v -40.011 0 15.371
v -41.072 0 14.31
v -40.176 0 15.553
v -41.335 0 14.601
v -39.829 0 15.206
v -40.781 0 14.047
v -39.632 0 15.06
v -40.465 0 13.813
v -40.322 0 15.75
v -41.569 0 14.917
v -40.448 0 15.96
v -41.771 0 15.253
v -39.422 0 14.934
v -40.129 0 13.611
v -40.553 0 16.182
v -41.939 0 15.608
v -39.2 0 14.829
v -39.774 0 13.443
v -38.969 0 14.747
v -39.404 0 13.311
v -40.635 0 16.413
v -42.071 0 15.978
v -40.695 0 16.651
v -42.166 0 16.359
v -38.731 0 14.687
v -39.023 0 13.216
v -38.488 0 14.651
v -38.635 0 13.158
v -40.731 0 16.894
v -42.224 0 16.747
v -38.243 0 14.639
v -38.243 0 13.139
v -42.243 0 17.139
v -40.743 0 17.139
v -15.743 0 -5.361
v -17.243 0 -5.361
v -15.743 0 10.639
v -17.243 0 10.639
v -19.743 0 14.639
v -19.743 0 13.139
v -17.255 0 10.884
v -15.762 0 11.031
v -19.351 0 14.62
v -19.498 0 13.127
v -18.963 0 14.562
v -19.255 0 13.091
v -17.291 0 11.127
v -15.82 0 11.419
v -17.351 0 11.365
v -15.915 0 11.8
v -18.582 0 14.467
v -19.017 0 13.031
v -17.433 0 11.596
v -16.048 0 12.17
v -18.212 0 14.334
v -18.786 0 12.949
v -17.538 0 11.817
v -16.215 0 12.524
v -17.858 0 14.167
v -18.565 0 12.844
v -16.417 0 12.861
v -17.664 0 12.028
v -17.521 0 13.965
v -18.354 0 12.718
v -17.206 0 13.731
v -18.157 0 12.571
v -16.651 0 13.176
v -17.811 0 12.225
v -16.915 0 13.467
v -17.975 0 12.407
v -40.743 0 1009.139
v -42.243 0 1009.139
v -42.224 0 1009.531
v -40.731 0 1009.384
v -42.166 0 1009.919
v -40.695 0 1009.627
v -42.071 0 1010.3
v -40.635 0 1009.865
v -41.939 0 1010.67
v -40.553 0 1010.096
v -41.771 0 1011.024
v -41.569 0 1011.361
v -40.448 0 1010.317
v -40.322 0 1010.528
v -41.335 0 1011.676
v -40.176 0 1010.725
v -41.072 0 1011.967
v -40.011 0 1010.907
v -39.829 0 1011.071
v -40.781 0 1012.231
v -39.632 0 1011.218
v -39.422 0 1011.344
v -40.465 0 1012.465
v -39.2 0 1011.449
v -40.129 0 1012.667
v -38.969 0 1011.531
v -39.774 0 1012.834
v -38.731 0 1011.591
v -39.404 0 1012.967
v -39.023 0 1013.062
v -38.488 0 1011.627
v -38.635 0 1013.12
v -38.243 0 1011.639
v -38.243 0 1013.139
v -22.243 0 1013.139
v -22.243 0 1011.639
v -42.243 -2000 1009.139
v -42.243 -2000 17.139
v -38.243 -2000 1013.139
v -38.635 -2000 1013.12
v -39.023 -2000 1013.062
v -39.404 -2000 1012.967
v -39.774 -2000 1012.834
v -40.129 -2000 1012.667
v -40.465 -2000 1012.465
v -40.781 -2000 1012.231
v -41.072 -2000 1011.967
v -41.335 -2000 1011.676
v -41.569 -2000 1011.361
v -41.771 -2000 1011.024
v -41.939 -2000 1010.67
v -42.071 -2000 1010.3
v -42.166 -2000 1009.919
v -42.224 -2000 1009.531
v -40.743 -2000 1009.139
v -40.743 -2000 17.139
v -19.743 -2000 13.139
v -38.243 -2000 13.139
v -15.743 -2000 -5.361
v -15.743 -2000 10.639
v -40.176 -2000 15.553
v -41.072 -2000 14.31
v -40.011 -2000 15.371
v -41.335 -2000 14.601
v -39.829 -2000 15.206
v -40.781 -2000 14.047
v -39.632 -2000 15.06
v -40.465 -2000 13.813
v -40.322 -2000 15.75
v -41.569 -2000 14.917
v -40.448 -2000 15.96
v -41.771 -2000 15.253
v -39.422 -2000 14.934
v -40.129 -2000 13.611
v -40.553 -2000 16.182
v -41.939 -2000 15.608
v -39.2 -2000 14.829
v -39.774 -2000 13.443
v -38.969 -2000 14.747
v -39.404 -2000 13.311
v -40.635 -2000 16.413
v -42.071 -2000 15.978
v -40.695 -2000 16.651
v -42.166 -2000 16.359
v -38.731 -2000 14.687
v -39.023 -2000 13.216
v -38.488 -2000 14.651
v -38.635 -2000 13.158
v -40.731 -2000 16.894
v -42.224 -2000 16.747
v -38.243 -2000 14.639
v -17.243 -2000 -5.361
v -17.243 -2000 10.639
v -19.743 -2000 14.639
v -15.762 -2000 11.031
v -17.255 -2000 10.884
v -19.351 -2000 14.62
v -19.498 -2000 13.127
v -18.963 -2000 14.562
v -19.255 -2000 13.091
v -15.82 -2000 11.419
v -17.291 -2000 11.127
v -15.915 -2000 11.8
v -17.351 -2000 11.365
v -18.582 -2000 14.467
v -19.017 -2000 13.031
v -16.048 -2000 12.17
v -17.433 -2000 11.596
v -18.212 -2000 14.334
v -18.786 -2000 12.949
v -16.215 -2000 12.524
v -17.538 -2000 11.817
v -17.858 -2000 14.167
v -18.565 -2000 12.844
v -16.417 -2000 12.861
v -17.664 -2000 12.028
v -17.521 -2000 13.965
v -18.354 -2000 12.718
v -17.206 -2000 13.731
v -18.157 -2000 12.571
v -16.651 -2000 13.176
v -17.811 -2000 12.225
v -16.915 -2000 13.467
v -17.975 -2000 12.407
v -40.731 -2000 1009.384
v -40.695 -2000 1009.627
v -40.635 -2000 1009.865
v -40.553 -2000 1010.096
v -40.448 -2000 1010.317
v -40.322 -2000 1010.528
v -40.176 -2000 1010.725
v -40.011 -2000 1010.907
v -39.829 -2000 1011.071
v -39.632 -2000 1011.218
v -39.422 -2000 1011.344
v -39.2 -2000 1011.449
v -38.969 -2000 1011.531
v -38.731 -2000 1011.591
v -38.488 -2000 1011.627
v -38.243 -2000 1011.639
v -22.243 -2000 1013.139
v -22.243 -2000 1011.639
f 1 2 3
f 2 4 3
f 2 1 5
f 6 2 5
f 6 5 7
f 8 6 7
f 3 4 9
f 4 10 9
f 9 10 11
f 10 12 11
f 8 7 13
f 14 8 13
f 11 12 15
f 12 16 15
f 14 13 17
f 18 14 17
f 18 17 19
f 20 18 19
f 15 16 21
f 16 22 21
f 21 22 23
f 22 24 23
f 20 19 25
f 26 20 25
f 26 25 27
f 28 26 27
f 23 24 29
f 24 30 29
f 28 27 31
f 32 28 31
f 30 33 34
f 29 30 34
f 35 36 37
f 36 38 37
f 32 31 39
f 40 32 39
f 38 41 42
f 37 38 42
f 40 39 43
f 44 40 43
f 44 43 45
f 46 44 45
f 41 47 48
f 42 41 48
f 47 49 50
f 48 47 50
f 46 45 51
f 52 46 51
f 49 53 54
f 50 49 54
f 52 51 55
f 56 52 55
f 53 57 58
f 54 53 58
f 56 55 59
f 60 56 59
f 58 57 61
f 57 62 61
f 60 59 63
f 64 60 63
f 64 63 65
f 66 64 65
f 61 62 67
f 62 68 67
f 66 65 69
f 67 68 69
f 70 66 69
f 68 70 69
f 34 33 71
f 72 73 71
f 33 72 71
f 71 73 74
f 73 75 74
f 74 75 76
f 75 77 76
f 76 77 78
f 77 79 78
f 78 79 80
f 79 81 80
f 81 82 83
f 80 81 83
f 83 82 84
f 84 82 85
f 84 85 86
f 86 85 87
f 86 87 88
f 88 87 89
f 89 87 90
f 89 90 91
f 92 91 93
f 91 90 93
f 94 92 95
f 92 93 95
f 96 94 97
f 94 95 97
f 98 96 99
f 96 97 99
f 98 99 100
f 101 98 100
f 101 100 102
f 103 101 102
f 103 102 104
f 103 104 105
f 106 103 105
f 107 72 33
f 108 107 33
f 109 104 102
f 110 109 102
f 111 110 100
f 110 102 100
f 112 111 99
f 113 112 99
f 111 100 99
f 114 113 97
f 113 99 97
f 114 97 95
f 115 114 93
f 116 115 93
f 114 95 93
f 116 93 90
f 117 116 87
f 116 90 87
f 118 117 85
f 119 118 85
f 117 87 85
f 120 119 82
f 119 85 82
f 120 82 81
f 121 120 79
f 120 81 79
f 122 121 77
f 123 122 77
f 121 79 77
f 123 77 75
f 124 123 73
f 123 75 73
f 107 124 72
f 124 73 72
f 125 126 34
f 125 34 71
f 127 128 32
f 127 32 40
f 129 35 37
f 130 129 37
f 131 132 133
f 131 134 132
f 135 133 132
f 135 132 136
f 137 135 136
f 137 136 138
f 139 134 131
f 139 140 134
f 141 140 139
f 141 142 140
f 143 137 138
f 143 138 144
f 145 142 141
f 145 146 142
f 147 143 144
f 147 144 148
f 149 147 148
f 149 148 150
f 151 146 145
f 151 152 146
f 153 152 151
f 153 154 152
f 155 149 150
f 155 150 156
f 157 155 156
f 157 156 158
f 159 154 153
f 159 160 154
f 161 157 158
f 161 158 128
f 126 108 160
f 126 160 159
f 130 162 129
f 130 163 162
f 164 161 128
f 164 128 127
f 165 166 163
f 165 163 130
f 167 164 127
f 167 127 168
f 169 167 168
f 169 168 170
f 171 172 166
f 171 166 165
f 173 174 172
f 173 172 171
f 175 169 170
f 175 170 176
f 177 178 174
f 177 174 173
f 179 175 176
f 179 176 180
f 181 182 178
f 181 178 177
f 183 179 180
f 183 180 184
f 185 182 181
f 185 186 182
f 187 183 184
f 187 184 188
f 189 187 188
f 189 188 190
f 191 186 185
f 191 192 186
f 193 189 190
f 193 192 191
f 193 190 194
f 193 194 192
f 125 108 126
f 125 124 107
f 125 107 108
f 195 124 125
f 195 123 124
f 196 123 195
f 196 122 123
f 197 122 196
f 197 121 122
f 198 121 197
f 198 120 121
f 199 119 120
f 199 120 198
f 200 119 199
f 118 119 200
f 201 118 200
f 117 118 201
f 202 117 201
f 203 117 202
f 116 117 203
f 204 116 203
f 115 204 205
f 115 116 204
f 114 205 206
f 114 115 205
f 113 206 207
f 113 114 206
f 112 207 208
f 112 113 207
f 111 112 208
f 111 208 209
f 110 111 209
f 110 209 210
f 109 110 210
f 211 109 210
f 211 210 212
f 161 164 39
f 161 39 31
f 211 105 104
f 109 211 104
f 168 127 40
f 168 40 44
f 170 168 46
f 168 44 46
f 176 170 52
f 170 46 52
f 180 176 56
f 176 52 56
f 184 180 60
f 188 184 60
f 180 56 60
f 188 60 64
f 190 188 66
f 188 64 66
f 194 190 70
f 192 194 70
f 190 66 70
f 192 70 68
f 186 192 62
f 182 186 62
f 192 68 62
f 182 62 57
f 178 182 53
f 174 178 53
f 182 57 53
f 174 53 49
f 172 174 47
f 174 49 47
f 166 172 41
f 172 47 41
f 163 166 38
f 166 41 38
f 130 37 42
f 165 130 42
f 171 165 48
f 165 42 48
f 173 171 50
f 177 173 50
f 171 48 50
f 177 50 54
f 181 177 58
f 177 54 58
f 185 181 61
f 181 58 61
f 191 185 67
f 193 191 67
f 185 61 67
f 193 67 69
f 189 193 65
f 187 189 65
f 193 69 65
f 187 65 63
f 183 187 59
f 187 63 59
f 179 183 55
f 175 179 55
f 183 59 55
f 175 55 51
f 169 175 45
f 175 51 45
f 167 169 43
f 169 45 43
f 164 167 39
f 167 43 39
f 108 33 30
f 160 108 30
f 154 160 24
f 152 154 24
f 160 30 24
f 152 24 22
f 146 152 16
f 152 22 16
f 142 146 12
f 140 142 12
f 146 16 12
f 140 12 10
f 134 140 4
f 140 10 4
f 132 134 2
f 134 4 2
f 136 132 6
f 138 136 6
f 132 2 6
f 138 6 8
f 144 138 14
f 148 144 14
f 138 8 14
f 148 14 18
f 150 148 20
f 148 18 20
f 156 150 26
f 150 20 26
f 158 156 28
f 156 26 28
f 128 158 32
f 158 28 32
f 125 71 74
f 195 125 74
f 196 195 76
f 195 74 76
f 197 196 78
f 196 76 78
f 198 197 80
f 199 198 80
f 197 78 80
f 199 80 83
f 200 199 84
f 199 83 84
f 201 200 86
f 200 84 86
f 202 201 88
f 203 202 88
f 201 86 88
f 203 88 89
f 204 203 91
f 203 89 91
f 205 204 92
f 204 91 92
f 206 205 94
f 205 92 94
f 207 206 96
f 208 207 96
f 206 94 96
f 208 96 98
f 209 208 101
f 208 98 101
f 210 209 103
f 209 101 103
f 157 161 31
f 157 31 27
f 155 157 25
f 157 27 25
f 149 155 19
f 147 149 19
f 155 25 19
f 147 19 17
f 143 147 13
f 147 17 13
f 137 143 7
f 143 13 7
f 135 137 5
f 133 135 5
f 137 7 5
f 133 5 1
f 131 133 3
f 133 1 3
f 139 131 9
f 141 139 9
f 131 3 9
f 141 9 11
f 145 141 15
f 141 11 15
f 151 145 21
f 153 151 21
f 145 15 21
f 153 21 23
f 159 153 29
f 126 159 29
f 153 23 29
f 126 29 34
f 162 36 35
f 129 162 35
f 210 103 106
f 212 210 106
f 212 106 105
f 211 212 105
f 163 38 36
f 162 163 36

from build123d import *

# Parameters (mm, degrees)
F1_DEPTH = 2000


with BuildPart() as f1:
    # F0 (on Front) → F1 (new body)
    with BuildSketch(Plane.XZ):
        with BuildLine():
            Line((-17.24309, -5.361117), (-15.74309, -5.361117))
            Line((-15.74309, -5.361117), (-15.74309, 10.638883))
            ThreePointArc((-15.74309, 10.638883), (-16.914663, 13.46731), (-19.74309, 14.638883))
            Line((-19.74309, 14.638883), (-38.24309, 14.638883))
            ThreePointArc((-38.24309, 14.638883), (-40.010857, 15.371116), (-40.74309, 17.138883))
            Line((-40.74309, 17.138883), (-40.74309, 1009.138883))
            ThreePointArc((-40.74309, 1009.138883), (-40.010857, 1010.90665), (-38.24309, 1011.638883))
            Line((-38.24309, 1011.638883), (-22.24309, 1011.638883))
            Line((-22.24309, 1011.638883), (-22.24309, 1013.138883))
            Line((-22.24309, 1013.138883), (-38.24309, 1013.138883))
            ThreePointArc((-38.24309, 1013.138883), (-41.071517, 1011.96731), (-42.24309, 1009.138883))
            Line((-42.24309, 1009.138883), (-42.24309, 17.138883))
            ThreePointArc((-42.24309, 17.138883), (-41.071517, 14.310456), (-38.24309, 13.138883))
            Line((-38.24309, 13.138883), (-19.74309, 13.138883))
            ThreePointArc((-19.74309, 13.138883), (-17.975323, 12.40665), (-17.24309, 10.638883))
            Line((-17.24309, 10.638883), (-17.24309, -5.361117))
        make_face()
    extrude(amount=F1_DEPTH)


solid = f1.part
